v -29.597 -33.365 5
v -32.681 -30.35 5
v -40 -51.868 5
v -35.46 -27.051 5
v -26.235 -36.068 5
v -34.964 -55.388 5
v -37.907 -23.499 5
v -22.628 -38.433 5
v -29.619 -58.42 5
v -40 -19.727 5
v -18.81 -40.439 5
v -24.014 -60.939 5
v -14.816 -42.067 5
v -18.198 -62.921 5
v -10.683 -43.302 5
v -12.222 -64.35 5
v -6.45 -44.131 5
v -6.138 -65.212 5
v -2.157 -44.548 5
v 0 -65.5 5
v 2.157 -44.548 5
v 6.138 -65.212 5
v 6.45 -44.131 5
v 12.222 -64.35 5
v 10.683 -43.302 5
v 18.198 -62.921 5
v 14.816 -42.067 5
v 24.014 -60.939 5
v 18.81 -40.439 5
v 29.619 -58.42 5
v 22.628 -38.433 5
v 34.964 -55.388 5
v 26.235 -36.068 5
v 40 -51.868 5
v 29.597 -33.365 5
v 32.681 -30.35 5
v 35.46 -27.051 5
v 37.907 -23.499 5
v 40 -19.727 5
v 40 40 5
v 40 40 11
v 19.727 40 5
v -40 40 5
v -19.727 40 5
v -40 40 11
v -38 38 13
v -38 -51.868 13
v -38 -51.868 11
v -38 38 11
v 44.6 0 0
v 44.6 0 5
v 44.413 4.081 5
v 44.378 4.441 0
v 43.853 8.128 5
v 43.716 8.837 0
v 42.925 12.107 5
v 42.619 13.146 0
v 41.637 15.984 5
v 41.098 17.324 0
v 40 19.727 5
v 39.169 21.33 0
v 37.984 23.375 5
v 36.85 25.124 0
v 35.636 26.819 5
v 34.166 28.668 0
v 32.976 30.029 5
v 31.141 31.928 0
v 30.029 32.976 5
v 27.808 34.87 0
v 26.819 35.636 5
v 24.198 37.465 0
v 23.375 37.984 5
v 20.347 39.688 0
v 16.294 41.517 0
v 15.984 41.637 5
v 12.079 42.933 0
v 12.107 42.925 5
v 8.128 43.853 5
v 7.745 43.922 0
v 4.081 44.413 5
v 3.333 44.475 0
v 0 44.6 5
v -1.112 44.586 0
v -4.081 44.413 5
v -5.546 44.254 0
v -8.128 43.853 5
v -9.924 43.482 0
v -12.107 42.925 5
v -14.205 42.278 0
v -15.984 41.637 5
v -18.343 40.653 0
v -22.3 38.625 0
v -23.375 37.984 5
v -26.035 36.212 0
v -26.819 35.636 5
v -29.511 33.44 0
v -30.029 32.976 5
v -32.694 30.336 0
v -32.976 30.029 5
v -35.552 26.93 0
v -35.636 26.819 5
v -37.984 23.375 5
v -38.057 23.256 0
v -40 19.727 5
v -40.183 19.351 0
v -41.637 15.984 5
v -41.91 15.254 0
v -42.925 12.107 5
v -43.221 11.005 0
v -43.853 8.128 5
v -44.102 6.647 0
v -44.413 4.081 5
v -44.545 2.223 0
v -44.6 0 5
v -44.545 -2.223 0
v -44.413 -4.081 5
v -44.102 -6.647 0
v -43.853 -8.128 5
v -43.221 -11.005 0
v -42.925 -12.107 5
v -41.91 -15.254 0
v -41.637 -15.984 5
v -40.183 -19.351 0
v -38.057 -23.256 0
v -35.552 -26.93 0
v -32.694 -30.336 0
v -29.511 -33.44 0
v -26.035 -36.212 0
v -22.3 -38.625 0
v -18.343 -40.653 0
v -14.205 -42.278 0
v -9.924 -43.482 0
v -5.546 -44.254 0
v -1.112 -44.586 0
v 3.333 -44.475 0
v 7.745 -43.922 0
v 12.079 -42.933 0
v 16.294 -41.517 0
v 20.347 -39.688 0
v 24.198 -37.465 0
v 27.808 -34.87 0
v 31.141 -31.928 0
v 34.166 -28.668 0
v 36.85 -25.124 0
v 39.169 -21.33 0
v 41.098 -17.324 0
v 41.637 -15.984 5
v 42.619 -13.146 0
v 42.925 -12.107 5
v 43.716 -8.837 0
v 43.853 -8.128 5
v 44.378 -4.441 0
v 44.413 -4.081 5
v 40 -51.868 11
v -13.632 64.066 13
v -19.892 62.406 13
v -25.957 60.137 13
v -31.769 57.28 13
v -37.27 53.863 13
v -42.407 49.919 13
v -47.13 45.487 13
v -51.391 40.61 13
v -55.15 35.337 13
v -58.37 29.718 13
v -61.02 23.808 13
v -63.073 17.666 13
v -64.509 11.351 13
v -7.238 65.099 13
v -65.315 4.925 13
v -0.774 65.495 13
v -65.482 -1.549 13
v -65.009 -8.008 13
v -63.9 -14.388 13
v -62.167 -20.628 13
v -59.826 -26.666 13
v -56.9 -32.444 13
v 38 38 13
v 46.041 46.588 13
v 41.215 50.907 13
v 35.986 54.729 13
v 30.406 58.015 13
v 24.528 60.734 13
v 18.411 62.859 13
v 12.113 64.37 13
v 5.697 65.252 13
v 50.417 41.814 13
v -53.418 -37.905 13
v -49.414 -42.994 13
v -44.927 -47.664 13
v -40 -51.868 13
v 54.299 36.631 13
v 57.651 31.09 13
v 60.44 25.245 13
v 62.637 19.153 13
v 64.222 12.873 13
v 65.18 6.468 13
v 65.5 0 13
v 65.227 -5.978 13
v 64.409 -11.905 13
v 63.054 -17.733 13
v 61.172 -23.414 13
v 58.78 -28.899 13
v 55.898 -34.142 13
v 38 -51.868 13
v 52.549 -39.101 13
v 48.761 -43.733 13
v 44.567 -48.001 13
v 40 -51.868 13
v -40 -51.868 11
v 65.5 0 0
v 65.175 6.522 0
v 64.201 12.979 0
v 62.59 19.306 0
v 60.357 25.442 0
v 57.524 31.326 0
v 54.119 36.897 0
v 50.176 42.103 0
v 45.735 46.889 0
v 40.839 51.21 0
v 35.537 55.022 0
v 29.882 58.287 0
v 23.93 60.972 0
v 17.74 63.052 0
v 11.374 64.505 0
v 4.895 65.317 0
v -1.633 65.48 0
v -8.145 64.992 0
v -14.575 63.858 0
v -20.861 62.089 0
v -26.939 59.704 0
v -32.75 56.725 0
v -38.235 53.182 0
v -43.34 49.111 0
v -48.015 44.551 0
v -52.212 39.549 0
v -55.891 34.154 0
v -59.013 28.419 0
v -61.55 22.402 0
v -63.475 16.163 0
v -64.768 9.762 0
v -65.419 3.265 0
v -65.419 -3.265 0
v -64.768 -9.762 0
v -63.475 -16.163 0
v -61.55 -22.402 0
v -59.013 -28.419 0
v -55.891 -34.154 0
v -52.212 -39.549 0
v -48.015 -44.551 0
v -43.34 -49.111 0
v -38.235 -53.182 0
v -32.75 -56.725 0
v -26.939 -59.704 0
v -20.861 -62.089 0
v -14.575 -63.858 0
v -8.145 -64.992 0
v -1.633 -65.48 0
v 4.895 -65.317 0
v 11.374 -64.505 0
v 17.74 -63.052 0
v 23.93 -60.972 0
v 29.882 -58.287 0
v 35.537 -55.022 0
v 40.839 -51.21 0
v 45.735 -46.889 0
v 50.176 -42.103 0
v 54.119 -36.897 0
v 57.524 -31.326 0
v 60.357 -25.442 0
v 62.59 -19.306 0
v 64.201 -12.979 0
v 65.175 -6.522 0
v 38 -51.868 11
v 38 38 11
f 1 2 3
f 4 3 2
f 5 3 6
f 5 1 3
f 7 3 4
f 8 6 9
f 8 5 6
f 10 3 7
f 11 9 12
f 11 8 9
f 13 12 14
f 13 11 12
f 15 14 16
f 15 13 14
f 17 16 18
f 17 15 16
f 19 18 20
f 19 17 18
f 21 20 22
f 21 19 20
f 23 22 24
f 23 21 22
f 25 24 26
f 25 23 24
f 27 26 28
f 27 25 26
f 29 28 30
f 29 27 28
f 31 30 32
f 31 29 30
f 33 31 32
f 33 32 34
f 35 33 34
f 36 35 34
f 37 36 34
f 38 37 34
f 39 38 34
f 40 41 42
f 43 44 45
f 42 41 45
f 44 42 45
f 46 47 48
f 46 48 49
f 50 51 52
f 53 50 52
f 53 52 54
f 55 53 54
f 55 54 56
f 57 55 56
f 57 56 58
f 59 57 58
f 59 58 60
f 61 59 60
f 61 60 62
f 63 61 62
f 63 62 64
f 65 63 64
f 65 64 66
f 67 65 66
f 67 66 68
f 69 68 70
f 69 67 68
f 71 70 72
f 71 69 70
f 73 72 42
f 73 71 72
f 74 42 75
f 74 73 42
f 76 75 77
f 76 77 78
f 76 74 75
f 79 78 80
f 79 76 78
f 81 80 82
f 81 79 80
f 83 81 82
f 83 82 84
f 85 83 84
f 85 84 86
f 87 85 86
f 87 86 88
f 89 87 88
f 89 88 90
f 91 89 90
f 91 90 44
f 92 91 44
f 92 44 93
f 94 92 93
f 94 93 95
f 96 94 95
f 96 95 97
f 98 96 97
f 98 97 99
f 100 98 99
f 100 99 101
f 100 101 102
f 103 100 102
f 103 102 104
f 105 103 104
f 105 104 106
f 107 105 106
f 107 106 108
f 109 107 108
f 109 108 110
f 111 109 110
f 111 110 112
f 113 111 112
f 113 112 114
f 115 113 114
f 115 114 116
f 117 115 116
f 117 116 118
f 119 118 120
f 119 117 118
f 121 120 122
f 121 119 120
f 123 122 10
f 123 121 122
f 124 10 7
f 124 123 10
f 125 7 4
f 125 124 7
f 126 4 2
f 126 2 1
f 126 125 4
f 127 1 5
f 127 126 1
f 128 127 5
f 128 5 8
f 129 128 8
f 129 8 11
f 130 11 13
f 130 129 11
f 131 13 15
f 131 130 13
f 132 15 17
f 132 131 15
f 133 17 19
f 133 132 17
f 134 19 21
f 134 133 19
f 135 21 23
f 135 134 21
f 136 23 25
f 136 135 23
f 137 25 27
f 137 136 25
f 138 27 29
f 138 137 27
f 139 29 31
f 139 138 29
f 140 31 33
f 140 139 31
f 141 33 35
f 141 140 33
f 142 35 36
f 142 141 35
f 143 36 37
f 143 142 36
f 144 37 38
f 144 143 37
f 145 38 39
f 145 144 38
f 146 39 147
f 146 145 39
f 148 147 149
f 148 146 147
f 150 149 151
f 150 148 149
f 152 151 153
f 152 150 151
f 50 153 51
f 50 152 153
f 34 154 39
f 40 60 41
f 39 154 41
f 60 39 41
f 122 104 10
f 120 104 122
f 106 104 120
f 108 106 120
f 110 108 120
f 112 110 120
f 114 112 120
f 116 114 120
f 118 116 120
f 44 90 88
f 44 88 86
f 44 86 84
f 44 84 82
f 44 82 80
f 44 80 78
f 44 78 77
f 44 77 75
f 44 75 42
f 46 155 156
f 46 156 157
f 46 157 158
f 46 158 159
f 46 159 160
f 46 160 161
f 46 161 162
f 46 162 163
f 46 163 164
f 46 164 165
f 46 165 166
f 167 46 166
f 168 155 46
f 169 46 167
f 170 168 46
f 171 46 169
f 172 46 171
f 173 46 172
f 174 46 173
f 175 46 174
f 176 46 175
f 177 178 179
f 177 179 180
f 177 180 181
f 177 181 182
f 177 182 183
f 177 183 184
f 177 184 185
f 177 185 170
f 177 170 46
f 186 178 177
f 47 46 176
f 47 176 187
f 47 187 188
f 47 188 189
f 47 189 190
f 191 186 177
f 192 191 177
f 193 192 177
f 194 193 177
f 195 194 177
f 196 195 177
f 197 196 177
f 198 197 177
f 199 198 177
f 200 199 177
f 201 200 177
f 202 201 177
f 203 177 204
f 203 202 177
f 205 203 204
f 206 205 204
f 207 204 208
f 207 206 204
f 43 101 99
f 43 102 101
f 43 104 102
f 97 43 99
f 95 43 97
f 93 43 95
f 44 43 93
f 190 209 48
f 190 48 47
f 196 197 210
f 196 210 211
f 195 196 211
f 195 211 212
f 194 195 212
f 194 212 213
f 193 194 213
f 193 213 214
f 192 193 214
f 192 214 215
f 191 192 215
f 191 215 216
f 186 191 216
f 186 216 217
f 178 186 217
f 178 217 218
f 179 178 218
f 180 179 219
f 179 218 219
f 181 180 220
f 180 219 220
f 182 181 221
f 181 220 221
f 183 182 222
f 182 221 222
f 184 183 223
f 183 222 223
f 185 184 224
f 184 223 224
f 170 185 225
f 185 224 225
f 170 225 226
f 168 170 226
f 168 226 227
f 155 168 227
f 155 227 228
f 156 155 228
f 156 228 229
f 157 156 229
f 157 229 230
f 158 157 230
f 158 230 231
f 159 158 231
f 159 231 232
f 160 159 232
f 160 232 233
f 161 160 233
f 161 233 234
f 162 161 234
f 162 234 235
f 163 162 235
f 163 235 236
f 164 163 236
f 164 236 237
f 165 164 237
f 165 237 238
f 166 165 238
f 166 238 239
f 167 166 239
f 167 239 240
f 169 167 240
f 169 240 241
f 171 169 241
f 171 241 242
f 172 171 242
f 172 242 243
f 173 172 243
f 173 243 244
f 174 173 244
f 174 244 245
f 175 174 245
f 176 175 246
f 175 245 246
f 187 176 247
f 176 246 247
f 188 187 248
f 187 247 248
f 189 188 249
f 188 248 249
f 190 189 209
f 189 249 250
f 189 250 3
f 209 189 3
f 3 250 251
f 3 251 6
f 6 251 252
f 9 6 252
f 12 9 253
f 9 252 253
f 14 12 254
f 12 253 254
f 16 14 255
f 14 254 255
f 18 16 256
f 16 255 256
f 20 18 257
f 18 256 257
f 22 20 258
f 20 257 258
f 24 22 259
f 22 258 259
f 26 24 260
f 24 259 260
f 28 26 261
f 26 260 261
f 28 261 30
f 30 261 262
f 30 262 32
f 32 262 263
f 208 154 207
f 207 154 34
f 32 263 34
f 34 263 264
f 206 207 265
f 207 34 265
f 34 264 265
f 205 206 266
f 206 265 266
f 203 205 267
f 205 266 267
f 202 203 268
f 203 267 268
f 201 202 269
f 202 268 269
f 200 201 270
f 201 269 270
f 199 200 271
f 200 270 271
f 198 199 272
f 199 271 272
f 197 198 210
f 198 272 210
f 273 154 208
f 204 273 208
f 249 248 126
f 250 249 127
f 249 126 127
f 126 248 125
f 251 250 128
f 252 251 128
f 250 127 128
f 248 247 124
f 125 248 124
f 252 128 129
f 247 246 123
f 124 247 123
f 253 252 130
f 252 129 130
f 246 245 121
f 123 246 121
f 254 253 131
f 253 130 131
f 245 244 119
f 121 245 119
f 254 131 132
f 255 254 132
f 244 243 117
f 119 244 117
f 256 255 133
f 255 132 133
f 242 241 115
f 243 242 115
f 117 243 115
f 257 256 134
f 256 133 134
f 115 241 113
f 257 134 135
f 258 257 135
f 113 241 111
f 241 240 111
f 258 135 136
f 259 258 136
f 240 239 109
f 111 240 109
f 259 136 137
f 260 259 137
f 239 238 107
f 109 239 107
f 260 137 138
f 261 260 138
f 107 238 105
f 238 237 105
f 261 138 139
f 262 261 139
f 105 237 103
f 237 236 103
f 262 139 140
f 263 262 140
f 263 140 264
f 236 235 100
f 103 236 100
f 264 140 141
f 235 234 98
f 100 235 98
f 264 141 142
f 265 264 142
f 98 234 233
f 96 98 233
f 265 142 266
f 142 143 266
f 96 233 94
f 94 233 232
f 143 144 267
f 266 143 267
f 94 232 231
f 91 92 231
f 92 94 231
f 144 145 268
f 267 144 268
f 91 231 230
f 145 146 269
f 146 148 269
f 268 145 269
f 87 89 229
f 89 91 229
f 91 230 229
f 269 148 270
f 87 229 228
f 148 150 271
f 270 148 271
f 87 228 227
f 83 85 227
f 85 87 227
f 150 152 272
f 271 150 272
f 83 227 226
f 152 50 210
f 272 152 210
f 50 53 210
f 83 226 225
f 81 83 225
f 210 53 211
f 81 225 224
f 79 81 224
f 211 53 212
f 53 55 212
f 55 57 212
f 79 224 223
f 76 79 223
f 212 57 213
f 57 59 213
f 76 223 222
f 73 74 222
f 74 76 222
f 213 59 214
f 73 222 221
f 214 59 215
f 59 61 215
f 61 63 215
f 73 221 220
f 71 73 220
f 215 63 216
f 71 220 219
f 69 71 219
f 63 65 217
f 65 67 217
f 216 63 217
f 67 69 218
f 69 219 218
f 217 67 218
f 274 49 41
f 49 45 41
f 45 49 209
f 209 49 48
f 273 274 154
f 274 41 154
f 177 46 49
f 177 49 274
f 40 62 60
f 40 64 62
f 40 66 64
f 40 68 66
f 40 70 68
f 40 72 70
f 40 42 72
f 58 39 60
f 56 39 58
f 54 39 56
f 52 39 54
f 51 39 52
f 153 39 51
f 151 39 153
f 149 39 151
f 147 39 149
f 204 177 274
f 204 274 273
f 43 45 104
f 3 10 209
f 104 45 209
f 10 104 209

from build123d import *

# Parameters (mm, degrees)
F0_R      = 65.5
F1_DEPTH  = 13
F2_R      = 44.6
F2_R_2    = 34.6
F3_DEPTH  = 5
F4_R      = 34.6
F5_DEPTH  = 25
F7_DEPTH  = 8
F8_W      = 88.3397431672
F8_H      = 2
F9_DEPTH  = 2
F10_W     = 78
F10_H     = 2
F11_DEPTH = 2
F12_W     = 89.867619957
F12_H     = 2
F13_DEPTH = 2
F8_W_2    = 3.5278767898
F14_DEPTH = 2


with BuildPart() as f1:
    # F0 (on Top) → F1 (new body)
    with BuildSketch(Plane.XY):
        Circle(F0_R)
    extrude(amount=F1_DEPTH)

    # F2 (on Top) → F3 (cut)
    with BuildSketch(Plane.XY):
        Circle(F2_R)
        Circle(F2_R_2, mode=Mode.SUBTRACT)
        Circle(F2_R_2)
    extrude(amount=F3_DEPTH, mode=Mode.SUBTRACT)

    # F4 (on face) → F5 (cut)
    with BuildSketch(Plane(origin=(0, 0, 0), x_dir=(1, 0, 0), z_dir=(0, 0, -1))):
        Circle(F4_R)
    extrude(amount=-F5_DEPTH, mode=Mode.SUBTRACT)

    # F6 (on face) → F7 (cut)
    with BuildSketch(Plane.XY.offset(13)):
        with BuildLine():
            ThreePointArc((-34.6, 0), (0, 34.6), (34.6, 0))
            Line((34.6, 0), (40, 0))
            Line((40, 0), (40, 40))
            Line((40, 40), (-40, 40))
            Line((-40, 40), (-40, 0))
            Line((-40, 0), (-34.6, 0))
        make_face()
        with BuildLine():
            Line((40, 0), (34.6, 0))
            ThreePointArc((34.6, 0), (0, -34.6), (-34.6, 0))
            Line((-34.6, 0), (-40, 0))
            Line((-40, 0), (-40, -51.867619957))
            ThreePointArc((-40, -51.867619957), (0, -65.5), (40, -51.867619957))
            Line((40, -51.867619957), (40, 0))
        make_face()
    extrude(amount=-F7_DEPTH, mode=Mode.SUBTRACT)

    # F8 (on face) → F9 (join)
    with BuildSketch(Plane.YZ.offset(-40)):
        with Locations((-4.1698715836, 12)):
            Rectangle(F8_W, F8_H)
    extrude(amount=F9_DEPTH)

    # F10 (on face) → F11 (join)
    with BuildSketch(Plane.XZ.offset(-40)):
        with Locations((1, 12)):
            Rectangle(F10_W, F10_H)
    extrude(amount=F11_DEPTH)

    # F12 (on face) → F13 (join)
    with BuildSketch(Plane(origin=(40, 0, 0), x_dir=(0, -1, 0), z_dir=(-1, 0, 0))):
        with Locations((6.9338099785, 12)):
            Rectangle(F12_W, F12_H)
    extrude(amount=F13_DEPTH)

    # F8 (on face) → F14 (join)
    with BuildSketch(Plane.YZ.offset(-40)):
        with Locations((-4.1698715836, 12)):
            Rectangle(F8_W, F8_H)
        with Locations((-50.1036815621, 12)):
            Rectangle(F8_W_2, F8_H)
    extrude(amount=F14_DEPTH)


solid = f1.part
